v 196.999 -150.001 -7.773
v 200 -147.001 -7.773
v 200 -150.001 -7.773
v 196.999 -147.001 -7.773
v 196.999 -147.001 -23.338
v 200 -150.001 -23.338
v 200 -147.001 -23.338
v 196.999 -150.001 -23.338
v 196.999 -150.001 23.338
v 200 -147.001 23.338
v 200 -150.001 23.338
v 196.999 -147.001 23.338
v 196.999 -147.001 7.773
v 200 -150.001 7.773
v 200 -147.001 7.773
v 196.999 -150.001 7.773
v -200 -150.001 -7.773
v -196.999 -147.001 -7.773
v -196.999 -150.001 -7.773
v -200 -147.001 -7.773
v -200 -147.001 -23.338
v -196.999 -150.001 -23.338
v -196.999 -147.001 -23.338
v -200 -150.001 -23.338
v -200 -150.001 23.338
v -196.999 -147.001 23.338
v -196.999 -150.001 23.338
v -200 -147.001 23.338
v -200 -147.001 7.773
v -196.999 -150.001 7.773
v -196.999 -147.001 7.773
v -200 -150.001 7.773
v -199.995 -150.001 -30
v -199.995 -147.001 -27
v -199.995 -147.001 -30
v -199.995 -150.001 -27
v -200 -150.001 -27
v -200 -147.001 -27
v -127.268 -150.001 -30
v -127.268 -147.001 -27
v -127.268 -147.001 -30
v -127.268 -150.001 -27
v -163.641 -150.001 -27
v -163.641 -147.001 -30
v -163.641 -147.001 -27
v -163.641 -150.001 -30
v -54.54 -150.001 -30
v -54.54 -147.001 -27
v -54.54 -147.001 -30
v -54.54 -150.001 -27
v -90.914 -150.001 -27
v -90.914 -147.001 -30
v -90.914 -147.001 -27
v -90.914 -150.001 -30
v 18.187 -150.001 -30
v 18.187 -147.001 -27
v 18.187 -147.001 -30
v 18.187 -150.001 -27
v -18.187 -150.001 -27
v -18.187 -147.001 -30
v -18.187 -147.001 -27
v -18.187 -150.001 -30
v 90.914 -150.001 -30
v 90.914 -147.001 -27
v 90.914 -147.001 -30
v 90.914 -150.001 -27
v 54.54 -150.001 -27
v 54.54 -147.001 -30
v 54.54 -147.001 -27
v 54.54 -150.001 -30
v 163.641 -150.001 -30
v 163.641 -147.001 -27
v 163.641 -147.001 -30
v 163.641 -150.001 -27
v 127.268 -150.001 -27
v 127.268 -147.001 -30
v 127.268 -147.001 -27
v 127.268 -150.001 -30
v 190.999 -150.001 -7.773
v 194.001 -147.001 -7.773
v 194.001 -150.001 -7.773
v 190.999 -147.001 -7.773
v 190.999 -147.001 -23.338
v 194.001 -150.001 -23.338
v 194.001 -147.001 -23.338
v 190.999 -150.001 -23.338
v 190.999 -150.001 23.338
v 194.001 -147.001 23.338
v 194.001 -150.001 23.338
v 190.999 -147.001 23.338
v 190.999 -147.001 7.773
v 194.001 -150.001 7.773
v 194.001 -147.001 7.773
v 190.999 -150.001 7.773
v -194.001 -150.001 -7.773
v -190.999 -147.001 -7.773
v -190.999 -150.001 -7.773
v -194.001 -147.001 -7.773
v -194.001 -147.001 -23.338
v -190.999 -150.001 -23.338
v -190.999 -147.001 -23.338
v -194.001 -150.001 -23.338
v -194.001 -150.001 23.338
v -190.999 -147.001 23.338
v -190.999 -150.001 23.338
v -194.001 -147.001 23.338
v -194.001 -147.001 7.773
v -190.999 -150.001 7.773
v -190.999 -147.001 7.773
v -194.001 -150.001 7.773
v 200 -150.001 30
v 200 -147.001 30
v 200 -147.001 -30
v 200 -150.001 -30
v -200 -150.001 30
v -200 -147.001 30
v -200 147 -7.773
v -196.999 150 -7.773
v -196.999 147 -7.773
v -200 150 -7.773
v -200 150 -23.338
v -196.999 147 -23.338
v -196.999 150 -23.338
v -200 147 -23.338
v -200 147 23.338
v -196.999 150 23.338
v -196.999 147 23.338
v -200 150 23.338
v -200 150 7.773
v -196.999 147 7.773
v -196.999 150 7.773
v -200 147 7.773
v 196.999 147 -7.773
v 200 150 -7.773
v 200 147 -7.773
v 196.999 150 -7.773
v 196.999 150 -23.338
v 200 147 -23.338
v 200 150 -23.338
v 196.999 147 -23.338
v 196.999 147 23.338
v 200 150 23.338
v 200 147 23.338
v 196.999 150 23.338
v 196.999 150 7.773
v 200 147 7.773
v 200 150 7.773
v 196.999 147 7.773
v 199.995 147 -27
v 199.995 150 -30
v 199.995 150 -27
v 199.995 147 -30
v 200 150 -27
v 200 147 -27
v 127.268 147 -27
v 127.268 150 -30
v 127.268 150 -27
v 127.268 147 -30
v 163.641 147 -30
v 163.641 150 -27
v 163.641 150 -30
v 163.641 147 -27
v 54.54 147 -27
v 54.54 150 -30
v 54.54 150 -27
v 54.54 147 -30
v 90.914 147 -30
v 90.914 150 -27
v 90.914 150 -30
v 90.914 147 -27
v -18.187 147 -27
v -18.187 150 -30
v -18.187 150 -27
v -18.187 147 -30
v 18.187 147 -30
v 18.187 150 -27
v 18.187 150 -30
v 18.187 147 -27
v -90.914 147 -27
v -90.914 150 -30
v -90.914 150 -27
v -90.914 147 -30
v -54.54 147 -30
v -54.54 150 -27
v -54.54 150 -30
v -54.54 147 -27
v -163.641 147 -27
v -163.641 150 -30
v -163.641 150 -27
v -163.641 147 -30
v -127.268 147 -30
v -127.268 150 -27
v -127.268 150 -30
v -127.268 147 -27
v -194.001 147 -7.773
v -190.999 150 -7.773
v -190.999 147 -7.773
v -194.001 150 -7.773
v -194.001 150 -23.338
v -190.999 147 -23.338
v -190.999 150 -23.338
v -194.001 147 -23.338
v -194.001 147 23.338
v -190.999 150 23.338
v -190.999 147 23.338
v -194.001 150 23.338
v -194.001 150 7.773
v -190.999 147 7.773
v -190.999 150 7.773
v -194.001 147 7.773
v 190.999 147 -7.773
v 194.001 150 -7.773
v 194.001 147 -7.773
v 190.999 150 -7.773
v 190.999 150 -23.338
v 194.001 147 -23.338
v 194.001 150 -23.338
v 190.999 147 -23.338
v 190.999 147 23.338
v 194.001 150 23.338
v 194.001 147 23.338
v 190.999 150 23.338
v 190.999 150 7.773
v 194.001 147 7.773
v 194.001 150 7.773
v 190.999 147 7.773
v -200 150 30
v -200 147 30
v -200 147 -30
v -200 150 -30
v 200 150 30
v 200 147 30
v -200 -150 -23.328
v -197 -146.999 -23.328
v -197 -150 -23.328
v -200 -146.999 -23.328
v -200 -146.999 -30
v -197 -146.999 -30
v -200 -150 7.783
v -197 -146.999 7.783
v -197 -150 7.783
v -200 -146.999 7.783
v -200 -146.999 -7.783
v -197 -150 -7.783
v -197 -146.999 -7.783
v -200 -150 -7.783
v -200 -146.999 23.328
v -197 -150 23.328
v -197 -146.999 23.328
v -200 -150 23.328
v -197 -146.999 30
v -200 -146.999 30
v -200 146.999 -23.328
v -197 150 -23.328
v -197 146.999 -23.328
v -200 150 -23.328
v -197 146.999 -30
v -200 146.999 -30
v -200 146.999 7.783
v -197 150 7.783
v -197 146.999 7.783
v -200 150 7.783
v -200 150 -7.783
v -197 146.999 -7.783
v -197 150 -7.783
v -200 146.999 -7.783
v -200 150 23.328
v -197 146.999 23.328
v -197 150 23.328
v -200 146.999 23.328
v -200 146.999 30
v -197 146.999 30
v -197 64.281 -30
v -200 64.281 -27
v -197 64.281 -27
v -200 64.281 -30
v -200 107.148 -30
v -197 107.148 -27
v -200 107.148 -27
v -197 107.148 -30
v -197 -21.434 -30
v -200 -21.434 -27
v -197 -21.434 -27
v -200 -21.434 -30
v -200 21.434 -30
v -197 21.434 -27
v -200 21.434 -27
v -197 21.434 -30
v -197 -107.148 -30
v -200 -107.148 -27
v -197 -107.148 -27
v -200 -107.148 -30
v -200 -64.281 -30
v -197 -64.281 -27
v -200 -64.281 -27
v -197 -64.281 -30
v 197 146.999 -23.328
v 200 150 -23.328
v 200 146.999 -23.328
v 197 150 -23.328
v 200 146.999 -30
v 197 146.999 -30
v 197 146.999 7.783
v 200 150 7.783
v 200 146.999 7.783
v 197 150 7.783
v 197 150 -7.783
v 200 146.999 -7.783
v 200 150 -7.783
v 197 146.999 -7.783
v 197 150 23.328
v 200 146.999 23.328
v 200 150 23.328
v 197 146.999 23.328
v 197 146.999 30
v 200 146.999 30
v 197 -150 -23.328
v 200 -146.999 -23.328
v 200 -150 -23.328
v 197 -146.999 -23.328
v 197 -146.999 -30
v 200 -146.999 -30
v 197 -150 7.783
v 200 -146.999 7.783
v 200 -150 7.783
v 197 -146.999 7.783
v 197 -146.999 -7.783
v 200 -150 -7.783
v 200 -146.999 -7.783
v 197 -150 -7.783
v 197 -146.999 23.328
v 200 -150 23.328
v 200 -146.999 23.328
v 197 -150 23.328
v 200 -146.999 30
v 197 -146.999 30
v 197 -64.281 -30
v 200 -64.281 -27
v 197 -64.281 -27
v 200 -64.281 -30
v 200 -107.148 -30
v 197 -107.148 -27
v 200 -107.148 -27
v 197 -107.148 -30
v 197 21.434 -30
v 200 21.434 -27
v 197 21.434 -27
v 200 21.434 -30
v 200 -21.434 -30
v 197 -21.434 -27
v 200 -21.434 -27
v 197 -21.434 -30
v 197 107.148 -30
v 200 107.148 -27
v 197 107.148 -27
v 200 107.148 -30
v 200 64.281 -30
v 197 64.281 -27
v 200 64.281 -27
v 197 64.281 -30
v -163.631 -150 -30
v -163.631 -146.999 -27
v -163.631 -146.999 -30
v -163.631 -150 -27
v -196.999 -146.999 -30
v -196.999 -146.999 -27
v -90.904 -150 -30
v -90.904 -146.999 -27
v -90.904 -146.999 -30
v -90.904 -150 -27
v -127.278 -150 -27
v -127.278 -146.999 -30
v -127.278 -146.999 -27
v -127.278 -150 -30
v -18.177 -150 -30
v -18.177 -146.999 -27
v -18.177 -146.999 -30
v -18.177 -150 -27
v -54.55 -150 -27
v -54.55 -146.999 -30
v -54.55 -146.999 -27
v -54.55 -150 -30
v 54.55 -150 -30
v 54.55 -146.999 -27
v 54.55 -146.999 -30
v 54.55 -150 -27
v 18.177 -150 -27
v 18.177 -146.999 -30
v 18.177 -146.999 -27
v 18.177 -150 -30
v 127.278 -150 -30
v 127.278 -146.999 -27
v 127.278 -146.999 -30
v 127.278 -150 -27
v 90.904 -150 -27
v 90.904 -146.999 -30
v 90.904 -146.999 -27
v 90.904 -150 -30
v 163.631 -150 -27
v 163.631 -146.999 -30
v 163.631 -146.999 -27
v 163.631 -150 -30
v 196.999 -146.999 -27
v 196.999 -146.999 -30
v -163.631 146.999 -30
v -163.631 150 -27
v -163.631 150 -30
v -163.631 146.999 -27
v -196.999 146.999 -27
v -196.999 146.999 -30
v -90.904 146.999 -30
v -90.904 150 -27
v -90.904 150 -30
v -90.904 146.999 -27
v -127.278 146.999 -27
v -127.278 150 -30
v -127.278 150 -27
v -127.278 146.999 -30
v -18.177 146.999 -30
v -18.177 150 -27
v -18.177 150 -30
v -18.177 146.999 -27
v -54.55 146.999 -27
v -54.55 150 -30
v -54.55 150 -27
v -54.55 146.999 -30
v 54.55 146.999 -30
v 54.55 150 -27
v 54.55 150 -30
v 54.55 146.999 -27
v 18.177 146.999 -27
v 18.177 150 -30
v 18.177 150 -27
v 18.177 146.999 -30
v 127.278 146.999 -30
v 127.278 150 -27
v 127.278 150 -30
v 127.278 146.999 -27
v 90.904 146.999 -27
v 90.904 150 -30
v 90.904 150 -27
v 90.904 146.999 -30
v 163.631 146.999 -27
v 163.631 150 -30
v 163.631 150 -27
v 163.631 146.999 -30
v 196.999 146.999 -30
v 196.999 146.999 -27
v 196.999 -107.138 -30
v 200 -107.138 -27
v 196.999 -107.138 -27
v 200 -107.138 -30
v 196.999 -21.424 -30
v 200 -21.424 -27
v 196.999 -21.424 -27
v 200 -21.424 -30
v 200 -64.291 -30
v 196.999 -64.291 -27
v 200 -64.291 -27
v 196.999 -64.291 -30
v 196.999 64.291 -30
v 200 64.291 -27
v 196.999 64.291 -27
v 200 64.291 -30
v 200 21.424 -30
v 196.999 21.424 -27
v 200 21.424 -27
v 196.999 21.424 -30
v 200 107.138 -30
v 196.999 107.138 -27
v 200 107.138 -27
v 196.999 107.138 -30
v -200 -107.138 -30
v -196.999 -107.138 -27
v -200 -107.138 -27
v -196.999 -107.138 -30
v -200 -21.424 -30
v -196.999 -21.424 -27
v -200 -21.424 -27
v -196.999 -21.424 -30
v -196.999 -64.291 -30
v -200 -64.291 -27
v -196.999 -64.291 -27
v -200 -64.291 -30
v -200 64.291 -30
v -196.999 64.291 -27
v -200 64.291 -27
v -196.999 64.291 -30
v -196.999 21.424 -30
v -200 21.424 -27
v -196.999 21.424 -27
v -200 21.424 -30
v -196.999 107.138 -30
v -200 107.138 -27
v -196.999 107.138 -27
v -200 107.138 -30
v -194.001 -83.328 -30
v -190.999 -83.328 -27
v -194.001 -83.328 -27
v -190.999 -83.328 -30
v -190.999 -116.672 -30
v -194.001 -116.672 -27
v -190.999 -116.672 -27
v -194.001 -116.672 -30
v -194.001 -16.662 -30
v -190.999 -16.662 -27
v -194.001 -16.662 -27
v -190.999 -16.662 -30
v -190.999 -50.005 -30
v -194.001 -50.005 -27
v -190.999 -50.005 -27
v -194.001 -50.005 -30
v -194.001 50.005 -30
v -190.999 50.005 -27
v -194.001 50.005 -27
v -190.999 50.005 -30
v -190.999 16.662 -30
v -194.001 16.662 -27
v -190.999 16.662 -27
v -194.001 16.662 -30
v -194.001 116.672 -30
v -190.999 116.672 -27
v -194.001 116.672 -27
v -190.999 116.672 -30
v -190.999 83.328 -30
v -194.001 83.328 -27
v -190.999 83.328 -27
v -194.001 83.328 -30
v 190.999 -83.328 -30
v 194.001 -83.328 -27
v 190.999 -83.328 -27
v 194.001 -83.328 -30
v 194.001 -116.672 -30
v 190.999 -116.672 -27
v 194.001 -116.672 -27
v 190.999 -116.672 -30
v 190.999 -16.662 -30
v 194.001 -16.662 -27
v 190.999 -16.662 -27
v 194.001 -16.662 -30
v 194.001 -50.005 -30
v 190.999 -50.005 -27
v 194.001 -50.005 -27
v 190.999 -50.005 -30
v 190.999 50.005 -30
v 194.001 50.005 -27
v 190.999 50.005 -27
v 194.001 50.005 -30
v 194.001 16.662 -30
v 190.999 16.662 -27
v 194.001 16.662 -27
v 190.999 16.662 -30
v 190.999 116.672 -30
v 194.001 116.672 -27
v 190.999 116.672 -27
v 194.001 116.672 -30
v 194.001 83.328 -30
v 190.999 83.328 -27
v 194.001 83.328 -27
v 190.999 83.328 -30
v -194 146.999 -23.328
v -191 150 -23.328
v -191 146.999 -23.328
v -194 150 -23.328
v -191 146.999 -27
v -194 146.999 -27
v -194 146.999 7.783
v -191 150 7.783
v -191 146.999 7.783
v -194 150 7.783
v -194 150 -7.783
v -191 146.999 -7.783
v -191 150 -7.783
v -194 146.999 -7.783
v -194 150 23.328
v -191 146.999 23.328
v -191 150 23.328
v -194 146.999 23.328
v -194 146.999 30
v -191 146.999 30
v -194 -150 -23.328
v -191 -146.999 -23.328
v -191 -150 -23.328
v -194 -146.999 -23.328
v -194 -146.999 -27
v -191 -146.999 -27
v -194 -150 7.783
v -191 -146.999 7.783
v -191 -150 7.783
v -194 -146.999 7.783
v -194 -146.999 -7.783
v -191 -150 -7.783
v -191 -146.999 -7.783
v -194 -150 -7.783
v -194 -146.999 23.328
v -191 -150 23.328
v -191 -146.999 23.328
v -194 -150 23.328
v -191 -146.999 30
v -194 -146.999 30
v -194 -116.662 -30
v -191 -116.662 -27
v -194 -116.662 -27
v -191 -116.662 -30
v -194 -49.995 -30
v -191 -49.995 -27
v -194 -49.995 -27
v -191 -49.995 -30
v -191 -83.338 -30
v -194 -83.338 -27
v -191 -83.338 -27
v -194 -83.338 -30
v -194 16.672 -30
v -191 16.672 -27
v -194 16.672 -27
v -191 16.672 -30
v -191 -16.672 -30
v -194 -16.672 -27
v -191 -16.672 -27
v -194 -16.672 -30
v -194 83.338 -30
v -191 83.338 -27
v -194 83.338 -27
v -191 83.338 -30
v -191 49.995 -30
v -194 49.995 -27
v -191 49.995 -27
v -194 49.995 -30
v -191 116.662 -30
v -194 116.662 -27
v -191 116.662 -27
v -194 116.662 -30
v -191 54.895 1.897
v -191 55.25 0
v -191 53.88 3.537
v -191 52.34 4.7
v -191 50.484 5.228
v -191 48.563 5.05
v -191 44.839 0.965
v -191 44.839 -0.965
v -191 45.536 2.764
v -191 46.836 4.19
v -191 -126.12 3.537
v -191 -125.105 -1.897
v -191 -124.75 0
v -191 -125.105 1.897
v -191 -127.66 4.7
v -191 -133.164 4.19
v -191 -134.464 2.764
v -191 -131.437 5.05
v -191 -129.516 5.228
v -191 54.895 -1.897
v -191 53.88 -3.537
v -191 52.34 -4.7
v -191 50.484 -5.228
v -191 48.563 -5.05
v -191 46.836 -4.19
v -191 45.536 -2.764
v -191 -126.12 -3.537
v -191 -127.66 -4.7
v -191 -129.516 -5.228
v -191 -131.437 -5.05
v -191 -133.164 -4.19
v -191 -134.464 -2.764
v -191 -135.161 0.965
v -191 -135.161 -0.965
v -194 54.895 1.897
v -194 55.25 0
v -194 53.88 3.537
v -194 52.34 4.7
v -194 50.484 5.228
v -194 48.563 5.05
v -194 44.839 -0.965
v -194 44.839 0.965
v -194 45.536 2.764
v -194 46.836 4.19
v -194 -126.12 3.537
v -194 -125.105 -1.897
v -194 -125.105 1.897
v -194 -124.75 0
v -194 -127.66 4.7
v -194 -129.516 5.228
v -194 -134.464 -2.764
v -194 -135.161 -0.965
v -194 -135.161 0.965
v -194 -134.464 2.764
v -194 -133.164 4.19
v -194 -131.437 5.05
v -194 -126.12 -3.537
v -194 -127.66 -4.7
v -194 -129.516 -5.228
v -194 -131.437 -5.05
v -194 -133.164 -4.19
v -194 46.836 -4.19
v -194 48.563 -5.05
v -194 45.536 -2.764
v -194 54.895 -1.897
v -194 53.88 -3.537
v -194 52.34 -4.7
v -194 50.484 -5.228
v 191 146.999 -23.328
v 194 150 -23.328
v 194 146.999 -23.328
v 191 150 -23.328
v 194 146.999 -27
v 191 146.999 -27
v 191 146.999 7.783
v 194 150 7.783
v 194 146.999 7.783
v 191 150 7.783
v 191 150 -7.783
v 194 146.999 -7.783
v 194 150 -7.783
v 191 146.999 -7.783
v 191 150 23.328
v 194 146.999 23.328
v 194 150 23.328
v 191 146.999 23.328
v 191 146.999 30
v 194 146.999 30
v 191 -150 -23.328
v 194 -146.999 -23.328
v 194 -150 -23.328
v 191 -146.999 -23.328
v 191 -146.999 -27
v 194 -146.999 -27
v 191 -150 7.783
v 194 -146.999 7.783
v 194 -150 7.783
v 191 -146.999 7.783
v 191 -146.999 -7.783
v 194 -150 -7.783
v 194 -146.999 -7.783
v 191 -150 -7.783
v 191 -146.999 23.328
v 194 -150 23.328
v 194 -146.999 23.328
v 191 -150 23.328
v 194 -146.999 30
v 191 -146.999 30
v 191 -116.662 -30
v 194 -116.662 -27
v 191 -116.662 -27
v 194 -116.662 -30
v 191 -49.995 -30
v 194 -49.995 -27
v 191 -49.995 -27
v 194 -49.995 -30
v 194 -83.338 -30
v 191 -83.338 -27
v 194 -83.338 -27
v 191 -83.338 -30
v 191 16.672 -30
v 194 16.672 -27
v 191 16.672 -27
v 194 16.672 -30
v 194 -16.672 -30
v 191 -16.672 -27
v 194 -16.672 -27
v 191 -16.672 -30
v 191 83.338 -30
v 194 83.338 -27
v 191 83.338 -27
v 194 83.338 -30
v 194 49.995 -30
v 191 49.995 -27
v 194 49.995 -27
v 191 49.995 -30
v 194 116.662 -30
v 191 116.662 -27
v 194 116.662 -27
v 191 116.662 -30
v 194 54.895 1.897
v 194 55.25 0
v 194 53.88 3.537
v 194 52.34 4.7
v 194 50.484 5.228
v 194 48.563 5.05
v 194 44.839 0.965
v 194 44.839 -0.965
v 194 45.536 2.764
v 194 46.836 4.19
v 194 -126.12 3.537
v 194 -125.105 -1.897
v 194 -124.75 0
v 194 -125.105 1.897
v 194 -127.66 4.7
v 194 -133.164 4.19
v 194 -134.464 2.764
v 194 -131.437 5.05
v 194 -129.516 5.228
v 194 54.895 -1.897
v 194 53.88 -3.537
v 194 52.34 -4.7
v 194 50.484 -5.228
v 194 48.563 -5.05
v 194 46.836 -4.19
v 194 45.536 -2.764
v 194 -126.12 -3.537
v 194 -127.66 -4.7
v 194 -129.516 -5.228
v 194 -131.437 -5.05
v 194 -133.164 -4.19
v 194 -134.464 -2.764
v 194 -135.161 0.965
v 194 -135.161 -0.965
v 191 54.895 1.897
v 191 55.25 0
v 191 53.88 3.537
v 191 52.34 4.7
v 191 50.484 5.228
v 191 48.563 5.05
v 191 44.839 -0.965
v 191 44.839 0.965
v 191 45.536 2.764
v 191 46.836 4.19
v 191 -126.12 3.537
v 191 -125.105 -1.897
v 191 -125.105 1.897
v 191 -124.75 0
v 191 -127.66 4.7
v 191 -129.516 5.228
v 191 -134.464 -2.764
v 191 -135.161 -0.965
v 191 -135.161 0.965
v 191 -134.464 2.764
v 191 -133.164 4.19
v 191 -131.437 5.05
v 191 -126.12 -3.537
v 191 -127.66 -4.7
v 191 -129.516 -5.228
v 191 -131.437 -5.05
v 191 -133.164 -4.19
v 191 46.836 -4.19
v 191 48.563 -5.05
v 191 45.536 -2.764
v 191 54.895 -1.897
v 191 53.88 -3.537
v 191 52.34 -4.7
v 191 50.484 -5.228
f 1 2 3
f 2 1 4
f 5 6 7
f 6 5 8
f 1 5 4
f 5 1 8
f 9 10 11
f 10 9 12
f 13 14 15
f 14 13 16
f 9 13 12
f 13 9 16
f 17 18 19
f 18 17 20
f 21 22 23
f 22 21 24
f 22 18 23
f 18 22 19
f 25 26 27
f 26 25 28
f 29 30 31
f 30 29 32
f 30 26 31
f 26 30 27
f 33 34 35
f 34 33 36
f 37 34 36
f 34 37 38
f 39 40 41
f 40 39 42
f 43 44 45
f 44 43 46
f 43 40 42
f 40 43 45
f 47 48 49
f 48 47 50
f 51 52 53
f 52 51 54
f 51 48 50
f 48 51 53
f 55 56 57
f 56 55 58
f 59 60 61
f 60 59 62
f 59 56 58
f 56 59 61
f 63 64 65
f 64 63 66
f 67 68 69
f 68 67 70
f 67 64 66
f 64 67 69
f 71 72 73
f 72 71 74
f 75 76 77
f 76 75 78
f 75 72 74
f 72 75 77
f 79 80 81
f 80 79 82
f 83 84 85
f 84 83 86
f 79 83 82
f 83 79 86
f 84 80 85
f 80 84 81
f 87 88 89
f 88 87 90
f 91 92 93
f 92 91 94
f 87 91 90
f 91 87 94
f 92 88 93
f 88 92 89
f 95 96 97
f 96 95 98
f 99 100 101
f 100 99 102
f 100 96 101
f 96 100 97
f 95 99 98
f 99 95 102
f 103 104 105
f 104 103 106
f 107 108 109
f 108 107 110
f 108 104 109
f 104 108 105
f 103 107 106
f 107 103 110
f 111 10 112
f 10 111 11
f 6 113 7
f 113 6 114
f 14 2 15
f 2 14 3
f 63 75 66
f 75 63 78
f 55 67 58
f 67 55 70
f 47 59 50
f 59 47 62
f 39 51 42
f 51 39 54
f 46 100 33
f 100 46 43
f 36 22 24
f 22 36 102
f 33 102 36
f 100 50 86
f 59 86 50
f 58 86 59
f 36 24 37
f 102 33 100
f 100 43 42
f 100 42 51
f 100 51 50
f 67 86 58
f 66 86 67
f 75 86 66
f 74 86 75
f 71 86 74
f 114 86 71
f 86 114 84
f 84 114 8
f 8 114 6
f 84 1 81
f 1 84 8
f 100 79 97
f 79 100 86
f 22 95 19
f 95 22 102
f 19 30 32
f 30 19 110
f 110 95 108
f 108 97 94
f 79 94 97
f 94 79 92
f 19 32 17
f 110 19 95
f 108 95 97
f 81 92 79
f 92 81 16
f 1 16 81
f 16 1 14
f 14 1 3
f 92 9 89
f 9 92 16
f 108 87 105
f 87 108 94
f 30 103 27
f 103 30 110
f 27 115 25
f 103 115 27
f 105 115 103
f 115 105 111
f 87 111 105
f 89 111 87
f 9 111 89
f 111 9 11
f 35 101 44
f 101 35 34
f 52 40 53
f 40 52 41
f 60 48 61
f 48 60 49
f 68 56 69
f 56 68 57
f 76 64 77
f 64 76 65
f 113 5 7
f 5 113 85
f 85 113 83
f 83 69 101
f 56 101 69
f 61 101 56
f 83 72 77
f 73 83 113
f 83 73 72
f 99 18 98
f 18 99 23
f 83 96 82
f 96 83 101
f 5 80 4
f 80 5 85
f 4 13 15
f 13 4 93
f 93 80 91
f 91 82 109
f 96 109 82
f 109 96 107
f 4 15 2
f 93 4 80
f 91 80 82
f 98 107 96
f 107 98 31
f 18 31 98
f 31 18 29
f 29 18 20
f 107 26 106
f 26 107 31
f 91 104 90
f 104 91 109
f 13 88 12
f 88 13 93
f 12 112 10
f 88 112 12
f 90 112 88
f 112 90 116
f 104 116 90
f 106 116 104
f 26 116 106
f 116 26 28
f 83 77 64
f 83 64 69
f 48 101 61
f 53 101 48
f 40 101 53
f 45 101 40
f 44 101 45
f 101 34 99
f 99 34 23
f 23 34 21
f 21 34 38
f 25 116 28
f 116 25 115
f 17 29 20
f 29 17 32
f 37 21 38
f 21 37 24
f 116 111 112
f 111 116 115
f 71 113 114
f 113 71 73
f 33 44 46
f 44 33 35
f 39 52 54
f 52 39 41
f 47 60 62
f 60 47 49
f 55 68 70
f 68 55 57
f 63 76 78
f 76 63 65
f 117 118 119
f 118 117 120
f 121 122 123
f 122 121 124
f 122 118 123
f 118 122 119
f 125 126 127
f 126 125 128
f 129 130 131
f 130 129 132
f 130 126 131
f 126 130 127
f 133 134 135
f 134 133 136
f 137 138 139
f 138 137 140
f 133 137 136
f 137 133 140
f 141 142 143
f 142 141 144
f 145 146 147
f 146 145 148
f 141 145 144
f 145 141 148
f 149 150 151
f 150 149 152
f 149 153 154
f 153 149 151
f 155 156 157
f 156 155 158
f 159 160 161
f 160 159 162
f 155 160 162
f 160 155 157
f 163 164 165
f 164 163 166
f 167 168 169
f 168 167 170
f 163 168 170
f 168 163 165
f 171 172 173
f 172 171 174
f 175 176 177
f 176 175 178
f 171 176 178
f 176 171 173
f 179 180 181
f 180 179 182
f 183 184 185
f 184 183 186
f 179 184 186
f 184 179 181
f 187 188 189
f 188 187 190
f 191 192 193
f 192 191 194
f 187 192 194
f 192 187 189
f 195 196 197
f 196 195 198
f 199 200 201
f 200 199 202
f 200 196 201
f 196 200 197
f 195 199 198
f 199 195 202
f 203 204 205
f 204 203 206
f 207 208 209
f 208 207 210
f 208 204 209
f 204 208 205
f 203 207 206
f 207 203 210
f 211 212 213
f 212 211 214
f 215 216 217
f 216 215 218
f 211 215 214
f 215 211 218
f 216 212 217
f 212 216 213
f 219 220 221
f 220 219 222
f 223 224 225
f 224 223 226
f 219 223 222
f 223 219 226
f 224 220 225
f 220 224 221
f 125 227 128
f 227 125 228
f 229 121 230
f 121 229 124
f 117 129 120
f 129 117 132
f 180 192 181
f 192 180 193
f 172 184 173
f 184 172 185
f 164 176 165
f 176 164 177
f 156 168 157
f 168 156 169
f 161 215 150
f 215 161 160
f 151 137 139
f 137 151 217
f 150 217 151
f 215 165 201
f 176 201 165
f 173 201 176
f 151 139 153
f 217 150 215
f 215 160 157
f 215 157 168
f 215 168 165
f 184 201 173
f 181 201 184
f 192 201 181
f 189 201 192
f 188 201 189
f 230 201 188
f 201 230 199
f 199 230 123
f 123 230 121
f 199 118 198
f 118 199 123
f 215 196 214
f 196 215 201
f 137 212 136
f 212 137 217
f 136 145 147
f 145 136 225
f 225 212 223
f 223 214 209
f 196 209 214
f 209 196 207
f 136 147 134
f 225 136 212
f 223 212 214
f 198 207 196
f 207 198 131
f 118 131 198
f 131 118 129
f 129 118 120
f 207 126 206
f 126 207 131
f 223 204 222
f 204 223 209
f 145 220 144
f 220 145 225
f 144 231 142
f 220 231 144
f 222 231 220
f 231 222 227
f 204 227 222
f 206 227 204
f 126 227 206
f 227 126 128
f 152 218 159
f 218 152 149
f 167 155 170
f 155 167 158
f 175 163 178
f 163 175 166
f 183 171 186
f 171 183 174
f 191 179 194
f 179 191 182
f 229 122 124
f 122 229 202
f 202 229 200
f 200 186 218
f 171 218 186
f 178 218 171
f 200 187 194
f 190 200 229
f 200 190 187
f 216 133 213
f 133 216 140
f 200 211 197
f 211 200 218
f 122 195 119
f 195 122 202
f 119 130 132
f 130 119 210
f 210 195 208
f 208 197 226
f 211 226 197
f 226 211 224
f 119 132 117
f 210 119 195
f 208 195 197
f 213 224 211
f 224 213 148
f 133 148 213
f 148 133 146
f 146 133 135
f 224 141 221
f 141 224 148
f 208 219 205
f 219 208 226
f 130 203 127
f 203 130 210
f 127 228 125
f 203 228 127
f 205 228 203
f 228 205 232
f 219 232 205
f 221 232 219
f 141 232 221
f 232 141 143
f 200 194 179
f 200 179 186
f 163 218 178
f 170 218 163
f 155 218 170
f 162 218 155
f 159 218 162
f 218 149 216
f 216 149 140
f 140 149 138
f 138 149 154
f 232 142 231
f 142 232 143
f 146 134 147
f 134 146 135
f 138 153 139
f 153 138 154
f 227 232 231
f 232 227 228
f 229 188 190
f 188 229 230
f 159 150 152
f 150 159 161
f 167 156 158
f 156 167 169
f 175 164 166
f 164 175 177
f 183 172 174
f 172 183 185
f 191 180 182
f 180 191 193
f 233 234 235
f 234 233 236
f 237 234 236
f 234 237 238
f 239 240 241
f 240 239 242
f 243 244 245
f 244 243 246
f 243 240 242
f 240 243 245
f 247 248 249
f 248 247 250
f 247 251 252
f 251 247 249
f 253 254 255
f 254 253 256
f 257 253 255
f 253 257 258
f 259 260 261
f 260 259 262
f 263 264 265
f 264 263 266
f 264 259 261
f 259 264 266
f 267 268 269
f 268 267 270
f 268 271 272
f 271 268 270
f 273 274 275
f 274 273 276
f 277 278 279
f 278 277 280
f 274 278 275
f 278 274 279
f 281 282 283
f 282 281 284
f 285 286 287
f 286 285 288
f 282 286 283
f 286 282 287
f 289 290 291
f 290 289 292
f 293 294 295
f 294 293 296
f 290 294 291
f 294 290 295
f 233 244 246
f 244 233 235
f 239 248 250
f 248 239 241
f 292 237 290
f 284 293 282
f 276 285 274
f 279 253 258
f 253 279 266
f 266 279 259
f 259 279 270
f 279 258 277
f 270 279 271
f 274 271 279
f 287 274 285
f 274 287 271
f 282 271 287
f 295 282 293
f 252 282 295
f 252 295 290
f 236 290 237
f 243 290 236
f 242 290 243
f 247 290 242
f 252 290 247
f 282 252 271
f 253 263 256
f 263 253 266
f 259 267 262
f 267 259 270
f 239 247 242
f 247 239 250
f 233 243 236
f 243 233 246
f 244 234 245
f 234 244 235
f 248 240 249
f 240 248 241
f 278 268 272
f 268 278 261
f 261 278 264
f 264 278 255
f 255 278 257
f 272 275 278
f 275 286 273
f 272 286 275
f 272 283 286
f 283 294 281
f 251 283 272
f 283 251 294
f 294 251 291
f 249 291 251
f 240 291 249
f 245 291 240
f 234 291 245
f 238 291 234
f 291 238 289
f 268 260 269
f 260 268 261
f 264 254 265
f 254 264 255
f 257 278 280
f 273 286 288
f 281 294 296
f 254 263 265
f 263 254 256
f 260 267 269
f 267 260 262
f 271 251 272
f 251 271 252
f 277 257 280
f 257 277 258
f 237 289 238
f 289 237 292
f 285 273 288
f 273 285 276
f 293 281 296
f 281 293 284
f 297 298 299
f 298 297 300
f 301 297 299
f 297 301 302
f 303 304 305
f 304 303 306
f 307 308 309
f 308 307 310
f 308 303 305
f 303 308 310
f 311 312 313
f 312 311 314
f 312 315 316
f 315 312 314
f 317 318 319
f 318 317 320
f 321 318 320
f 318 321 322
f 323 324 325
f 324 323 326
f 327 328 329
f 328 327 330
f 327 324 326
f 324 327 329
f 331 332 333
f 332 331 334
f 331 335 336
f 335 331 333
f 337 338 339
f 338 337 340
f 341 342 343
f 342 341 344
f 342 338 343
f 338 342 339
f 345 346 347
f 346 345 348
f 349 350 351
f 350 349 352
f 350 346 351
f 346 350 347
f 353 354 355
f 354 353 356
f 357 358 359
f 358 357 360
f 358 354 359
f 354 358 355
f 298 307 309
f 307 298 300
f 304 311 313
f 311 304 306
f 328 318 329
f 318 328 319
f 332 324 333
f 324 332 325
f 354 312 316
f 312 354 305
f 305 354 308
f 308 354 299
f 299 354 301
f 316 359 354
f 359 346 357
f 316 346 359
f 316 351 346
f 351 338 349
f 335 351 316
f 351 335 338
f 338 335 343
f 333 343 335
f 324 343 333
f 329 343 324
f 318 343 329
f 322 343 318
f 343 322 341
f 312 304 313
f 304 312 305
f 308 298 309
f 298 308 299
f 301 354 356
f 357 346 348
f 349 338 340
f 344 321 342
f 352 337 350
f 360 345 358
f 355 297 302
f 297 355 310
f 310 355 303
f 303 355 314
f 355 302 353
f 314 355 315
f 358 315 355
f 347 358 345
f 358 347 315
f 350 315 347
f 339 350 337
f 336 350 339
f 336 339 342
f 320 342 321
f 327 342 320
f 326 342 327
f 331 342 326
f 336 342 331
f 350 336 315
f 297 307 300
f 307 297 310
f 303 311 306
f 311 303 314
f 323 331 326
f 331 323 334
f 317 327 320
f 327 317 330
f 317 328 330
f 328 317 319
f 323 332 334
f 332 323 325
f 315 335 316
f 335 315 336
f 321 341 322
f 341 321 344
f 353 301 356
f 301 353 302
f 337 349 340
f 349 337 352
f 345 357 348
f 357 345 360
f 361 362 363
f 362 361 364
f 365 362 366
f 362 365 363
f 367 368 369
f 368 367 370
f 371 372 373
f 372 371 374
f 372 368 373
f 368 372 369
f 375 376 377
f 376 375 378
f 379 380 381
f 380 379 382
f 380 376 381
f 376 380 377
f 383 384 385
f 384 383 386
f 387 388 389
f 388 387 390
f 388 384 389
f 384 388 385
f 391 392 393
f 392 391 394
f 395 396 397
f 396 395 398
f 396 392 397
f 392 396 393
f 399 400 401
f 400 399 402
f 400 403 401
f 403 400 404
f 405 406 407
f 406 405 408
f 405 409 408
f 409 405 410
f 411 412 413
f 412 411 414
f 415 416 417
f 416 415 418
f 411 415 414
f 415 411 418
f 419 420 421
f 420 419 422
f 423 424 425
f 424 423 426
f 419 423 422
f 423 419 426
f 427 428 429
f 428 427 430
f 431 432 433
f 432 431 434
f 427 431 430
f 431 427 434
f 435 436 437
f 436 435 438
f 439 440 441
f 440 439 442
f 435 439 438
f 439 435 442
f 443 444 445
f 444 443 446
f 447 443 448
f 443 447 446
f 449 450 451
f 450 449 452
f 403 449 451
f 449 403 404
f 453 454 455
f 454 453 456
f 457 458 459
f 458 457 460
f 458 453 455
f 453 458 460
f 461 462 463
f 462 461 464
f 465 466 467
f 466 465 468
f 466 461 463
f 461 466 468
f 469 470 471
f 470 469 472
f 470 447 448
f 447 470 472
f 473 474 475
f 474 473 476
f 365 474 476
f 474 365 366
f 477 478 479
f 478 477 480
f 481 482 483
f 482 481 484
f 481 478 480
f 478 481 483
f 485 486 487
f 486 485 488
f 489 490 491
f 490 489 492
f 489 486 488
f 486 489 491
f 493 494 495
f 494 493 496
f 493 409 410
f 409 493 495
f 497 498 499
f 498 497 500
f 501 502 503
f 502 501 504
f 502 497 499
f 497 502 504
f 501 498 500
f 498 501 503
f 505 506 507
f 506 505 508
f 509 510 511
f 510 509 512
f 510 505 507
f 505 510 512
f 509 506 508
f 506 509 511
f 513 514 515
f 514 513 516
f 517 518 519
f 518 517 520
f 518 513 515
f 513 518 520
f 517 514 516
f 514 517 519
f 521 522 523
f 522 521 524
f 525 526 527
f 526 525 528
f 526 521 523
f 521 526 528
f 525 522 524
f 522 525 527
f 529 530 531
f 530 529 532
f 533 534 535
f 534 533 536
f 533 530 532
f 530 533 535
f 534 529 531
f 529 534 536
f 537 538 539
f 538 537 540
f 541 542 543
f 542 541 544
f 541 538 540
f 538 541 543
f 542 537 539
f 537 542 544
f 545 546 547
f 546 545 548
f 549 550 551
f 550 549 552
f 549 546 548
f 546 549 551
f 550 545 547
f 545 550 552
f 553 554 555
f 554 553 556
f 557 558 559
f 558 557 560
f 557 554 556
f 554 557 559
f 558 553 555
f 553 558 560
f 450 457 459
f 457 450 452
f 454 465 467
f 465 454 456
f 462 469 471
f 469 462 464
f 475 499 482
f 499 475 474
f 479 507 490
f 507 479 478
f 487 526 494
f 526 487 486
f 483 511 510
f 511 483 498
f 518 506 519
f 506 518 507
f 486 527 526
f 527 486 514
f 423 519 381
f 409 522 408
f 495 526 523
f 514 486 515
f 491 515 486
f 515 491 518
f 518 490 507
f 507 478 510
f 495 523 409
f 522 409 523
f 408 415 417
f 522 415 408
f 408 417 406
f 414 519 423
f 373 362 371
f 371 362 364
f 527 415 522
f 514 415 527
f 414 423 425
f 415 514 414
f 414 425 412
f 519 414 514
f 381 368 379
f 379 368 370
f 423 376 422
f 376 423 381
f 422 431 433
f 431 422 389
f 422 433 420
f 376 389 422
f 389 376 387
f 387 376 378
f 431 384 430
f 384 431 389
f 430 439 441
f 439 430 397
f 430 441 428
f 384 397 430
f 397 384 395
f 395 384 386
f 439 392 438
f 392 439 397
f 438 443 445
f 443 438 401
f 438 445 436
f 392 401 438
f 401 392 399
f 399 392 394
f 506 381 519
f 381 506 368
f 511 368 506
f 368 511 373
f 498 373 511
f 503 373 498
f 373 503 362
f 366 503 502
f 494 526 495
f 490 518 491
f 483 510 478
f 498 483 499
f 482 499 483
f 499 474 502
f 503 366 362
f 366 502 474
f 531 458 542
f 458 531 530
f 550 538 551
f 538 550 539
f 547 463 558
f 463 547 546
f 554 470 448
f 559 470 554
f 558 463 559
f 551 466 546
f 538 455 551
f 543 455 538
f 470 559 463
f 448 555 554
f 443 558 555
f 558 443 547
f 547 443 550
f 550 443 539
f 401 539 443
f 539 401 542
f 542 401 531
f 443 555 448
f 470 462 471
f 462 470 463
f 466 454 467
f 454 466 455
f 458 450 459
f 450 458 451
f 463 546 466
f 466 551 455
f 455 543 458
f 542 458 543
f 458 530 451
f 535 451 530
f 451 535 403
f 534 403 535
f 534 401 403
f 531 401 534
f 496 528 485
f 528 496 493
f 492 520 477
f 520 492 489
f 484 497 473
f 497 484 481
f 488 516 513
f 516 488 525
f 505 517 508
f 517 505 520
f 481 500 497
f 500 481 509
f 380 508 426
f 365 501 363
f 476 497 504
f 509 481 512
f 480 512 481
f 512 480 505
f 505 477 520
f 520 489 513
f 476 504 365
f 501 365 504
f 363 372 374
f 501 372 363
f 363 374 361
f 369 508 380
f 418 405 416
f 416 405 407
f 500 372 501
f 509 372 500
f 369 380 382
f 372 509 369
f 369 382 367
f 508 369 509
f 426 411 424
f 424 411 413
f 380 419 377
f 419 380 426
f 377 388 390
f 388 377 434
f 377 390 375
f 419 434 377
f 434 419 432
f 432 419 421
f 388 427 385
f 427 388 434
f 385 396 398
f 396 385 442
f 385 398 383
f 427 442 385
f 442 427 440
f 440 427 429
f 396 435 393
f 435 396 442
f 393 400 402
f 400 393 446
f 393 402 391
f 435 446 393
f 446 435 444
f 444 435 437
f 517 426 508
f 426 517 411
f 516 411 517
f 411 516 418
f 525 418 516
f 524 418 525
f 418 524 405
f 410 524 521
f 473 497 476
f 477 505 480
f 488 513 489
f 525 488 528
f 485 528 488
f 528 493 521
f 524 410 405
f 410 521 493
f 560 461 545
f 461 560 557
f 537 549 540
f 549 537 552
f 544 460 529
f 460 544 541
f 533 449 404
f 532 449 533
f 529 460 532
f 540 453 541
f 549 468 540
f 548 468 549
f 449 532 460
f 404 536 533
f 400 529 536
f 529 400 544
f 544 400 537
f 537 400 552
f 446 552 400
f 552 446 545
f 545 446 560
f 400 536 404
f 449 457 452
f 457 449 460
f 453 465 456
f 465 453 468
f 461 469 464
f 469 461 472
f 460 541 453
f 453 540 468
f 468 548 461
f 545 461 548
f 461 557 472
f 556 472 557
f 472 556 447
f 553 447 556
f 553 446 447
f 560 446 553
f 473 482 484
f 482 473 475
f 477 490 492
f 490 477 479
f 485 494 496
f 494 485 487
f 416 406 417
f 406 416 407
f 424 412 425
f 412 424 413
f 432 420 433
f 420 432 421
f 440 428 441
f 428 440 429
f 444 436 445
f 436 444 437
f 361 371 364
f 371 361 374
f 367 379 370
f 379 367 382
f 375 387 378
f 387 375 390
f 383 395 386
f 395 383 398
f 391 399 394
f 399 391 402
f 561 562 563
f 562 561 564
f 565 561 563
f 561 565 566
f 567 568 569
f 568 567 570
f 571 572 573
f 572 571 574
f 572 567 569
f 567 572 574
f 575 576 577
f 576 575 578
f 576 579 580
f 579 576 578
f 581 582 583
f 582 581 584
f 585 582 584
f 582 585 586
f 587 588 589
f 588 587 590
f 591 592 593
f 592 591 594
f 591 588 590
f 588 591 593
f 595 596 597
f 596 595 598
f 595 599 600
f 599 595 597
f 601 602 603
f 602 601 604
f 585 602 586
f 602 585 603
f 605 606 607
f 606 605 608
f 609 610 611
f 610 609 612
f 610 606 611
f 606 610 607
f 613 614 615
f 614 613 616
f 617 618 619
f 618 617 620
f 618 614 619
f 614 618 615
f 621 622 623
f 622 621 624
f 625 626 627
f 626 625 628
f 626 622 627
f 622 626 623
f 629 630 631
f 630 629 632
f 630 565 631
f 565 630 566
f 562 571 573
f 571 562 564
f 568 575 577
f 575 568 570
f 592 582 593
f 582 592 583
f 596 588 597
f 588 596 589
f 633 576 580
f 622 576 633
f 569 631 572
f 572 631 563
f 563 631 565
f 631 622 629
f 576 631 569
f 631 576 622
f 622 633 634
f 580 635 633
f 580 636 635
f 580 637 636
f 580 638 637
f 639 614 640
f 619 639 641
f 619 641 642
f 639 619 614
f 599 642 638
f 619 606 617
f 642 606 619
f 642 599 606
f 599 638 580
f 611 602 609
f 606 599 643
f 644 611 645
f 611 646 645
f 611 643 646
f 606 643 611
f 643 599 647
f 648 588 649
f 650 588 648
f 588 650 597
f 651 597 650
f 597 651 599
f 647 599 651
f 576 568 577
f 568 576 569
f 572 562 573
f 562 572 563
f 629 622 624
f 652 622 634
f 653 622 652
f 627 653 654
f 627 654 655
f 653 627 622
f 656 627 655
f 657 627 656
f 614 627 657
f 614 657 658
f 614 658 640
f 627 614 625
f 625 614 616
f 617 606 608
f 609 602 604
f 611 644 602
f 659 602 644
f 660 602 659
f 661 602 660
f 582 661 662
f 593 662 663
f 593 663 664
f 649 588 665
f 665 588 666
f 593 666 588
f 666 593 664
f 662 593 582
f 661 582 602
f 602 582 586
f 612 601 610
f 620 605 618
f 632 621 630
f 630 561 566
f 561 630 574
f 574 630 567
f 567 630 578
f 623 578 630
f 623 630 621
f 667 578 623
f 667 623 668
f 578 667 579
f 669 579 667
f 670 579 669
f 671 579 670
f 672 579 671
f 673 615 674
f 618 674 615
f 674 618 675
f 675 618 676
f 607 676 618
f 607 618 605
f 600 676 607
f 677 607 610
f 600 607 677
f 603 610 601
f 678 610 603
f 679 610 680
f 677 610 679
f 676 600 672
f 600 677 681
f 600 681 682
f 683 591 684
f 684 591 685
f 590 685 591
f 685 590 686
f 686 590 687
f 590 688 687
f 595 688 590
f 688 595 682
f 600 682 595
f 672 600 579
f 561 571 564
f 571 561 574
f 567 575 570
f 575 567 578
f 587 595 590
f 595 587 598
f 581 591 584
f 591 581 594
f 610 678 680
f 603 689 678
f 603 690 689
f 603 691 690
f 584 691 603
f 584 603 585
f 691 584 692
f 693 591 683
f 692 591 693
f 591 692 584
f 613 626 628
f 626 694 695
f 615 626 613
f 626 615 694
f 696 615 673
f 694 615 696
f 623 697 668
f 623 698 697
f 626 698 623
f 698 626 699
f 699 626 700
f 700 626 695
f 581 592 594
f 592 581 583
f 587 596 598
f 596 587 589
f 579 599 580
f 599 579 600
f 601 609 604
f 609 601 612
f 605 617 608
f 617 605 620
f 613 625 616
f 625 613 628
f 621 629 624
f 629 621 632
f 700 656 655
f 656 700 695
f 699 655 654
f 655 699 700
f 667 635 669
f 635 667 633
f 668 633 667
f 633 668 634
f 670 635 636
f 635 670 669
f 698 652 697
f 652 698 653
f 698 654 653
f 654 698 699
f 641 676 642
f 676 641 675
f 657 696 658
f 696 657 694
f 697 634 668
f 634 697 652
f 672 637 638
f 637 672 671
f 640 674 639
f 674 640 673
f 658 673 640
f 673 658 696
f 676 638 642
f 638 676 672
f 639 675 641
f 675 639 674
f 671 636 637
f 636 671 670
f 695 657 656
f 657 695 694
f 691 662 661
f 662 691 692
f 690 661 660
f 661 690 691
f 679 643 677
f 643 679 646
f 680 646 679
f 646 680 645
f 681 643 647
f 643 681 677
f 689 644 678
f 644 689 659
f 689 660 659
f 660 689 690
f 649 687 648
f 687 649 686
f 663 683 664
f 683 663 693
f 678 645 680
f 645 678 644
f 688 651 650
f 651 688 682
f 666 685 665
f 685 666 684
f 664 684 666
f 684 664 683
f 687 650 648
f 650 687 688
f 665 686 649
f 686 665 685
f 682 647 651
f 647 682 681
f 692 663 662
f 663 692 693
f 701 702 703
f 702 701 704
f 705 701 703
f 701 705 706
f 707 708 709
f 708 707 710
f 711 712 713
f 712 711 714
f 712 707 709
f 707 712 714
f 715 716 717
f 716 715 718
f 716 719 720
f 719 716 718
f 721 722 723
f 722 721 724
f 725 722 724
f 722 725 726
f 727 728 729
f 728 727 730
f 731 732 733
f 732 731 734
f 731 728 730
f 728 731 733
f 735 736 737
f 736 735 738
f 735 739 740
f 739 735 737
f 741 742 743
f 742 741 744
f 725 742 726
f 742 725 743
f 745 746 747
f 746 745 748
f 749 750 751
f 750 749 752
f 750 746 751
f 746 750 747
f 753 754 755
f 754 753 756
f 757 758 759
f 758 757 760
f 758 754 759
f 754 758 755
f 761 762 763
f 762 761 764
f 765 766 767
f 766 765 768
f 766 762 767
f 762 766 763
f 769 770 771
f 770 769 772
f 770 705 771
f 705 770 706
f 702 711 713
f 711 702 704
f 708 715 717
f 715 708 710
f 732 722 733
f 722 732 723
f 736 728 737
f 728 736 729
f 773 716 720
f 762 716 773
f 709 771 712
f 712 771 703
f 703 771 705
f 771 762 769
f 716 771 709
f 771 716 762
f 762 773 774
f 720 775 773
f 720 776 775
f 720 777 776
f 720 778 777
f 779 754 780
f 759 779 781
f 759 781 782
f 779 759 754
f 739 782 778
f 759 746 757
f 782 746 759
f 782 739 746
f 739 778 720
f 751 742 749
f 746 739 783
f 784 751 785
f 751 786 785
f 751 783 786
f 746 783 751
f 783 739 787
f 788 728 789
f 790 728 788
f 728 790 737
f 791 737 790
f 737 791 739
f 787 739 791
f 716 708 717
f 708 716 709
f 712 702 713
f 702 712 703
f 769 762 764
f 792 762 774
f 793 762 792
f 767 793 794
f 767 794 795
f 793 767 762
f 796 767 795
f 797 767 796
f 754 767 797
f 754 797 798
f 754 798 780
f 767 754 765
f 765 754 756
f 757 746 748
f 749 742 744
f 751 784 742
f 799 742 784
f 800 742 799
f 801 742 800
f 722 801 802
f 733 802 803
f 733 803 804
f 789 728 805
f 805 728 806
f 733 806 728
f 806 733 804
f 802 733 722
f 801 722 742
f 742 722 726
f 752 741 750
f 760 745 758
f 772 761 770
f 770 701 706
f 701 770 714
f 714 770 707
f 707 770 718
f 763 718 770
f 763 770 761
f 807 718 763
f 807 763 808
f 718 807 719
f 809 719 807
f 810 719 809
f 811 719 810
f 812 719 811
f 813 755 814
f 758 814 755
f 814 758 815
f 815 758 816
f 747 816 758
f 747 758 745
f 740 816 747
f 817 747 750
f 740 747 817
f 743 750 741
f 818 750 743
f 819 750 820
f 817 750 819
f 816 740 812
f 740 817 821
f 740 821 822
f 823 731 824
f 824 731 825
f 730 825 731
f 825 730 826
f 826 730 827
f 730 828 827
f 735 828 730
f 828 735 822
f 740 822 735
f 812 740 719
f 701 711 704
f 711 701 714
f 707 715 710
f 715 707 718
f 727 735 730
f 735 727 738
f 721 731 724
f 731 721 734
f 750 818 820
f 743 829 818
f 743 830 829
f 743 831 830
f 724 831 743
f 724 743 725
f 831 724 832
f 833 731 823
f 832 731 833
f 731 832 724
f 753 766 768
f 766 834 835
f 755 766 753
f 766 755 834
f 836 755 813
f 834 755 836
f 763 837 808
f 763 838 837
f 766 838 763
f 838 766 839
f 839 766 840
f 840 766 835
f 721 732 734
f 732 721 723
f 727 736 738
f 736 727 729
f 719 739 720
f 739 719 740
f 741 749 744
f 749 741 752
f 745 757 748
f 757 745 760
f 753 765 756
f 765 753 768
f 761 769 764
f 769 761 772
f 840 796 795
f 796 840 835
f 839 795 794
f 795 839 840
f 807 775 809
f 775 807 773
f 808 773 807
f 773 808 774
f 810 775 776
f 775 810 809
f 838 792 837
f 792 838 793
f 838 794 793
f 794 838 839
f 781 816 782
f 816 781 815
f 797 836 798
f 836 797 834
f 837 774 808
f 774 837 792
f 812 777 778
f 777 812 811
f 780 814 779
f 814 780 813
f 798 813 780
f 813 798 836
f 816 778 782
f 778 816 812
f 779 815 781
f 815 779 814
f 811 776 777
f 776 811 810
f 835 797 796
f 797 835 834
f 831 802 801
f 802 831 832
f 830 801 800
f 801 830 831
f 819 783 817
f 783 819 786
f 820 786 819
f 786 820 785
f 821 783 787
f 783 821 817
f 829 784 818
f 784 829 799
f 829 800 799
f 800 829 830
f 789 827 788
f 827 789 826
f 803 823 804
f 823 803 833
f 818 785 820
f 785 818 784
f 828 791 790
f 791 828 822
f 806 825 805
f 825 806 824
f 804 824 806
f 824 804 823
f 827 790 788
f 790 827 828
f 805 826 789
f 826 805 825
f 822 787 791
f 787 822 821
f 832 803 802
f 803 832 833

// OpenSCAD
// file: params.scad
// arguments
laser_beam_width=.005*25.4;
material_thickness=3;
h = 200;
w = 400;
d = 300;

lid_h = 60;

// calculated
bottom_h = h-lid_h;

strut_width=10;
strut_pivot_r=5;
strut_pivot_hole_r=5.5;

rear_strut_sagitta_ratio=3.5;
rear_strut_bottom_dx = 120;
rear_strut_bottom_dy = 50;
rear_strut_top_dx = 50;
rear_strut_top_dy = 0;
rear_strut_max_angle = 175;
// rear_strut_max_angle = 152.5;


rear_strut_delta_x = abs(rear_strut_bottom_dx - rear_strut_top_dx);
rear_strut_delta_y = abs((bottom_h / 2 - rear_strut_bottom_dy) + (lid_h / 2 - rear_strut_top_dy));
rear_strut_length = sqrt(pow(rear_strut_delta_x, 2) + pow(rear_strut_delta_y, 2));
rear_strut_init_angle = asin(rear_strut_delta_y / rear_strut_length);
// rear_strut_max_angle = rear_strut_init_angle;


front_strut_bottom_dx = 50;
front_strut_bottom_dy = 50;
front_strut_top_dx = -130;
front_strut_top_dy = 0;

front_strut_delta_x = abs(front_strut_bottom_dx - front_strut_top_dx);
front_strut_delta_y = abs((bottom_h / 2 - front_strut_bottom_dy) + (lid_h / 2 - front_strut_top_dy));
front_strut_length = sqrt(pow(front_strut_delta_x, 2) + pow(front_strut_delta_y, 2));
front_strut_init_angle = asin(front_strut_delta_y / front_strut_length);
echo("expected front strut init angle:", front_strut_init_angle);

bottom_bar = abs(front_strut_bottom_dx - rear_strut_bottom_dx);
diagonal_len = sqrt(pow(rear_strut_length, 2) + pow(bottom_bar, 2) - 2*rear_strut_length*bottom_bar*cos(rear_strut_max_angle));

echo("Diagonal len:", diagonal_len);

top_bar = abs(front_strut_top_dx - rear_strut_top_dx);
theta_upper = acos(
  (pow(front_strut_length, 2) + pow(diagonal_len, 2) - pow(top_bar, 2))
  /(2*front_strut_length*diagonal_len)
);
x = 
  (pow(diagonal_len, 2) + pow(bottom_bar, 2) - pow(rear_strut_length, 2))
  /(2*diagonal_len*bottom_bar);
theta_lower = acos(min(max(x, -1), 1));
echo("theta_lower:", theta_lower);

front_strut_max_angle = theta_lower + theta_upper;
echo ("front_strut_max_angle", front_strut_max_angle);

lid_angle_top = acos((pow(top_bar, 2) + pow(diagonal_len, 2) - pow(front_strut_length, 2))/(2*top_bar*diagonal_len));
lid_angle_bottom = (180 - rear_strut_max_angle - theta_lower);
lid_angle = lid_angle_top + lid_angle_bottom;
echo("lid_angle:", lid_angle);
// main file
include <params.scad>

module sawtooth(tab_size, tab_spacing, num_tabs) {
  for (i=[0:num_tabs-1]) {
    translate([(i - floor(num_tabs/2)) * 2 * tab_size + (num_tabs % 2 == 1 ? tab_size : 0), 0, 0]) 
    cube(size=[tab_size + 0.01, material_thickness+0.001, material_thickness*2], center=true);
  }
}

module lid_front() {
  color([255/255, 0/255, 0/255]) {
    render() difference() {
      cube(size=[w, lid_h, material_thickness], center=true);
      for (a = [0, 180]) {
        rotate([0, a, 0]) {
          translate([w/2 - material_thickness/2, 0, 0]) {
            rotate([0, 0, 90]) sawtooth(bottom_h/9, 0, 5);
          }
        }
      }
      translate([0, -lid_h/2 + material_thickness/2, 0]) sawtooth(w/11, 0, 6);

      for (a = [0, 180]) {
        rotate([0, a, 0]) {
          translate([w/2 - material_thickness/2 - 2*material_thickness, 0, 0]) {
            rotate([0, 0, 90]) sawtooth(bottom_h/9, 0, 5);
          }
        }
      }
    }
  }
}

module lid_back() {
  color([255/255, 0/255, 0/255]) render() difference() {
    cube(size=[w, lid_h, material_thickness], center=true);
    for (a = [0, 180]) {
      rotate([0, a, 0]) {
        translate([w/2 - material_thickness/2, 0, 0]) {
          rotate([0, 0, 90]) sawtooth(bottom_h/9, 0, 5);
        }
      }
    }

    translate([0, -lid_h/2+material_thickness/2, 0]) sawtooth(w/11, 0, 6);
    
    for (a = [0, 180]) {
      rotate([0, a, 0]) {
        translate([w/2 - material_thickness/2 - 2*material_thickness, 0, 0]) {
          rotate([0, 0, 90]) sawtooth(bottom_h/9, 0, 5);
        }
      }
    }
    
  }
}

module lid_side() {
  color([0/255, 255/255, 0/255]) {
    render() difference() {
      cube(size=[d, lid_h, material_thickness], center=true);
      for (a = [0, 180]) {
        rotate([0, a, 0]) {
          translate([d/2 - material_thickness/2, 0, 0]) {
            rotate([0, 0, 90]) sawtooth(bottom_h/9, 0, 6);
          }
        }
      }

      translate([0, -lid_h/2 + material_thickness/2, 0]) sawtooth(d/7, 0, 4);
    }
  }
}

module lid_bottom() {
  color([0/255, 0/255, 255/255]) {
    render() difference() {
      cube(size=[w, d, material_thickness], center=true);
      translate([0, -d/2 + material_thickness/2, 0]) sawtooth(w/11, 0, 7);
      translate([0, d/2 - material_thickness/2, 0]) sawtooth(w/11, 0, 7);
      for (a = [0, 180]) rotate([0, a, 0]) {
        translate([w/2 - material_thickness/2, 0, 0]) rotate([0, 0, 90]) sawtooth(d/7, 0, 5);
      }
      
      for (a = [0, 180]) rotate([0, a, 0]) {
        translate([-w/2 + material_thickness/2 + 2*material_thickness, 0, 0]) rotate([0, 0, 90]) sawtooth(d/9, 0, 5);
      }
    }
  }
}

module lid_retainer() {
  color([125/255, 125/255, 0/255]) {
    render() difference () {
      cube(size=[d, lid_h, material_thickness], center=true);

      for (a = [0, 180]) {
        rotate([0, a, 0]) {
          translate([d/2 - material_thickness/2, 0, 0]) {
            rotate([0, 0, 90]) sawtooth(bottom_h/9, 0, 6);
          }
        }
      }

      translate([0, -lid_h/2 + material_thickness/2, 0]) sawtooth(d/9, 0, 6);

      translate([rear_strut_top_dx, rear_strut_top_dy, 0]) cylinder(r=5.25, h=material_thickness*2, center=true);
      translate([front_strut_top_dx, front_strut_top_dy, 0]) cylinder(r=5.25, h=material_thickness*2, center=true);
    }
  }
}

module complete_lid() {
  translate([0, -d/2 + material_thickness/2 - 0.001, 0]) rotate([90, 0, 0]) lid_front();
  translate([0, d/2 - material_thickness/2, 0]) rotate([0, 0, 180]) rotate([90, 0, 0]) lid_back();
  translate([-w/2 + material_thickness/2, 0, 0]) rotate([0, 0, -90]) rotate([90, 0, 0]) lid_side();
  translate([w/2 - material_thickness/2, 0, 0]) rotate([0, 0, 90]) rotate([90, 0, 0]) lid_side();
  translate([0, 0, -lid_h/2 + material_thickness/2]) lid_bottom();

  translate([-w/2 + material_thickness/2 + 2*material_thickness, 0, 0]) rotate([0, 0, 90]) rotate([90, 0, 0]) lid_retainer();
  translate([w/2 - material_thickness/2 - 2*material_thickness, 0, 0]) rotate([0, 0, -90]) rotate([90, 0, 180]) lid_retainer();
}

complete_lid();
